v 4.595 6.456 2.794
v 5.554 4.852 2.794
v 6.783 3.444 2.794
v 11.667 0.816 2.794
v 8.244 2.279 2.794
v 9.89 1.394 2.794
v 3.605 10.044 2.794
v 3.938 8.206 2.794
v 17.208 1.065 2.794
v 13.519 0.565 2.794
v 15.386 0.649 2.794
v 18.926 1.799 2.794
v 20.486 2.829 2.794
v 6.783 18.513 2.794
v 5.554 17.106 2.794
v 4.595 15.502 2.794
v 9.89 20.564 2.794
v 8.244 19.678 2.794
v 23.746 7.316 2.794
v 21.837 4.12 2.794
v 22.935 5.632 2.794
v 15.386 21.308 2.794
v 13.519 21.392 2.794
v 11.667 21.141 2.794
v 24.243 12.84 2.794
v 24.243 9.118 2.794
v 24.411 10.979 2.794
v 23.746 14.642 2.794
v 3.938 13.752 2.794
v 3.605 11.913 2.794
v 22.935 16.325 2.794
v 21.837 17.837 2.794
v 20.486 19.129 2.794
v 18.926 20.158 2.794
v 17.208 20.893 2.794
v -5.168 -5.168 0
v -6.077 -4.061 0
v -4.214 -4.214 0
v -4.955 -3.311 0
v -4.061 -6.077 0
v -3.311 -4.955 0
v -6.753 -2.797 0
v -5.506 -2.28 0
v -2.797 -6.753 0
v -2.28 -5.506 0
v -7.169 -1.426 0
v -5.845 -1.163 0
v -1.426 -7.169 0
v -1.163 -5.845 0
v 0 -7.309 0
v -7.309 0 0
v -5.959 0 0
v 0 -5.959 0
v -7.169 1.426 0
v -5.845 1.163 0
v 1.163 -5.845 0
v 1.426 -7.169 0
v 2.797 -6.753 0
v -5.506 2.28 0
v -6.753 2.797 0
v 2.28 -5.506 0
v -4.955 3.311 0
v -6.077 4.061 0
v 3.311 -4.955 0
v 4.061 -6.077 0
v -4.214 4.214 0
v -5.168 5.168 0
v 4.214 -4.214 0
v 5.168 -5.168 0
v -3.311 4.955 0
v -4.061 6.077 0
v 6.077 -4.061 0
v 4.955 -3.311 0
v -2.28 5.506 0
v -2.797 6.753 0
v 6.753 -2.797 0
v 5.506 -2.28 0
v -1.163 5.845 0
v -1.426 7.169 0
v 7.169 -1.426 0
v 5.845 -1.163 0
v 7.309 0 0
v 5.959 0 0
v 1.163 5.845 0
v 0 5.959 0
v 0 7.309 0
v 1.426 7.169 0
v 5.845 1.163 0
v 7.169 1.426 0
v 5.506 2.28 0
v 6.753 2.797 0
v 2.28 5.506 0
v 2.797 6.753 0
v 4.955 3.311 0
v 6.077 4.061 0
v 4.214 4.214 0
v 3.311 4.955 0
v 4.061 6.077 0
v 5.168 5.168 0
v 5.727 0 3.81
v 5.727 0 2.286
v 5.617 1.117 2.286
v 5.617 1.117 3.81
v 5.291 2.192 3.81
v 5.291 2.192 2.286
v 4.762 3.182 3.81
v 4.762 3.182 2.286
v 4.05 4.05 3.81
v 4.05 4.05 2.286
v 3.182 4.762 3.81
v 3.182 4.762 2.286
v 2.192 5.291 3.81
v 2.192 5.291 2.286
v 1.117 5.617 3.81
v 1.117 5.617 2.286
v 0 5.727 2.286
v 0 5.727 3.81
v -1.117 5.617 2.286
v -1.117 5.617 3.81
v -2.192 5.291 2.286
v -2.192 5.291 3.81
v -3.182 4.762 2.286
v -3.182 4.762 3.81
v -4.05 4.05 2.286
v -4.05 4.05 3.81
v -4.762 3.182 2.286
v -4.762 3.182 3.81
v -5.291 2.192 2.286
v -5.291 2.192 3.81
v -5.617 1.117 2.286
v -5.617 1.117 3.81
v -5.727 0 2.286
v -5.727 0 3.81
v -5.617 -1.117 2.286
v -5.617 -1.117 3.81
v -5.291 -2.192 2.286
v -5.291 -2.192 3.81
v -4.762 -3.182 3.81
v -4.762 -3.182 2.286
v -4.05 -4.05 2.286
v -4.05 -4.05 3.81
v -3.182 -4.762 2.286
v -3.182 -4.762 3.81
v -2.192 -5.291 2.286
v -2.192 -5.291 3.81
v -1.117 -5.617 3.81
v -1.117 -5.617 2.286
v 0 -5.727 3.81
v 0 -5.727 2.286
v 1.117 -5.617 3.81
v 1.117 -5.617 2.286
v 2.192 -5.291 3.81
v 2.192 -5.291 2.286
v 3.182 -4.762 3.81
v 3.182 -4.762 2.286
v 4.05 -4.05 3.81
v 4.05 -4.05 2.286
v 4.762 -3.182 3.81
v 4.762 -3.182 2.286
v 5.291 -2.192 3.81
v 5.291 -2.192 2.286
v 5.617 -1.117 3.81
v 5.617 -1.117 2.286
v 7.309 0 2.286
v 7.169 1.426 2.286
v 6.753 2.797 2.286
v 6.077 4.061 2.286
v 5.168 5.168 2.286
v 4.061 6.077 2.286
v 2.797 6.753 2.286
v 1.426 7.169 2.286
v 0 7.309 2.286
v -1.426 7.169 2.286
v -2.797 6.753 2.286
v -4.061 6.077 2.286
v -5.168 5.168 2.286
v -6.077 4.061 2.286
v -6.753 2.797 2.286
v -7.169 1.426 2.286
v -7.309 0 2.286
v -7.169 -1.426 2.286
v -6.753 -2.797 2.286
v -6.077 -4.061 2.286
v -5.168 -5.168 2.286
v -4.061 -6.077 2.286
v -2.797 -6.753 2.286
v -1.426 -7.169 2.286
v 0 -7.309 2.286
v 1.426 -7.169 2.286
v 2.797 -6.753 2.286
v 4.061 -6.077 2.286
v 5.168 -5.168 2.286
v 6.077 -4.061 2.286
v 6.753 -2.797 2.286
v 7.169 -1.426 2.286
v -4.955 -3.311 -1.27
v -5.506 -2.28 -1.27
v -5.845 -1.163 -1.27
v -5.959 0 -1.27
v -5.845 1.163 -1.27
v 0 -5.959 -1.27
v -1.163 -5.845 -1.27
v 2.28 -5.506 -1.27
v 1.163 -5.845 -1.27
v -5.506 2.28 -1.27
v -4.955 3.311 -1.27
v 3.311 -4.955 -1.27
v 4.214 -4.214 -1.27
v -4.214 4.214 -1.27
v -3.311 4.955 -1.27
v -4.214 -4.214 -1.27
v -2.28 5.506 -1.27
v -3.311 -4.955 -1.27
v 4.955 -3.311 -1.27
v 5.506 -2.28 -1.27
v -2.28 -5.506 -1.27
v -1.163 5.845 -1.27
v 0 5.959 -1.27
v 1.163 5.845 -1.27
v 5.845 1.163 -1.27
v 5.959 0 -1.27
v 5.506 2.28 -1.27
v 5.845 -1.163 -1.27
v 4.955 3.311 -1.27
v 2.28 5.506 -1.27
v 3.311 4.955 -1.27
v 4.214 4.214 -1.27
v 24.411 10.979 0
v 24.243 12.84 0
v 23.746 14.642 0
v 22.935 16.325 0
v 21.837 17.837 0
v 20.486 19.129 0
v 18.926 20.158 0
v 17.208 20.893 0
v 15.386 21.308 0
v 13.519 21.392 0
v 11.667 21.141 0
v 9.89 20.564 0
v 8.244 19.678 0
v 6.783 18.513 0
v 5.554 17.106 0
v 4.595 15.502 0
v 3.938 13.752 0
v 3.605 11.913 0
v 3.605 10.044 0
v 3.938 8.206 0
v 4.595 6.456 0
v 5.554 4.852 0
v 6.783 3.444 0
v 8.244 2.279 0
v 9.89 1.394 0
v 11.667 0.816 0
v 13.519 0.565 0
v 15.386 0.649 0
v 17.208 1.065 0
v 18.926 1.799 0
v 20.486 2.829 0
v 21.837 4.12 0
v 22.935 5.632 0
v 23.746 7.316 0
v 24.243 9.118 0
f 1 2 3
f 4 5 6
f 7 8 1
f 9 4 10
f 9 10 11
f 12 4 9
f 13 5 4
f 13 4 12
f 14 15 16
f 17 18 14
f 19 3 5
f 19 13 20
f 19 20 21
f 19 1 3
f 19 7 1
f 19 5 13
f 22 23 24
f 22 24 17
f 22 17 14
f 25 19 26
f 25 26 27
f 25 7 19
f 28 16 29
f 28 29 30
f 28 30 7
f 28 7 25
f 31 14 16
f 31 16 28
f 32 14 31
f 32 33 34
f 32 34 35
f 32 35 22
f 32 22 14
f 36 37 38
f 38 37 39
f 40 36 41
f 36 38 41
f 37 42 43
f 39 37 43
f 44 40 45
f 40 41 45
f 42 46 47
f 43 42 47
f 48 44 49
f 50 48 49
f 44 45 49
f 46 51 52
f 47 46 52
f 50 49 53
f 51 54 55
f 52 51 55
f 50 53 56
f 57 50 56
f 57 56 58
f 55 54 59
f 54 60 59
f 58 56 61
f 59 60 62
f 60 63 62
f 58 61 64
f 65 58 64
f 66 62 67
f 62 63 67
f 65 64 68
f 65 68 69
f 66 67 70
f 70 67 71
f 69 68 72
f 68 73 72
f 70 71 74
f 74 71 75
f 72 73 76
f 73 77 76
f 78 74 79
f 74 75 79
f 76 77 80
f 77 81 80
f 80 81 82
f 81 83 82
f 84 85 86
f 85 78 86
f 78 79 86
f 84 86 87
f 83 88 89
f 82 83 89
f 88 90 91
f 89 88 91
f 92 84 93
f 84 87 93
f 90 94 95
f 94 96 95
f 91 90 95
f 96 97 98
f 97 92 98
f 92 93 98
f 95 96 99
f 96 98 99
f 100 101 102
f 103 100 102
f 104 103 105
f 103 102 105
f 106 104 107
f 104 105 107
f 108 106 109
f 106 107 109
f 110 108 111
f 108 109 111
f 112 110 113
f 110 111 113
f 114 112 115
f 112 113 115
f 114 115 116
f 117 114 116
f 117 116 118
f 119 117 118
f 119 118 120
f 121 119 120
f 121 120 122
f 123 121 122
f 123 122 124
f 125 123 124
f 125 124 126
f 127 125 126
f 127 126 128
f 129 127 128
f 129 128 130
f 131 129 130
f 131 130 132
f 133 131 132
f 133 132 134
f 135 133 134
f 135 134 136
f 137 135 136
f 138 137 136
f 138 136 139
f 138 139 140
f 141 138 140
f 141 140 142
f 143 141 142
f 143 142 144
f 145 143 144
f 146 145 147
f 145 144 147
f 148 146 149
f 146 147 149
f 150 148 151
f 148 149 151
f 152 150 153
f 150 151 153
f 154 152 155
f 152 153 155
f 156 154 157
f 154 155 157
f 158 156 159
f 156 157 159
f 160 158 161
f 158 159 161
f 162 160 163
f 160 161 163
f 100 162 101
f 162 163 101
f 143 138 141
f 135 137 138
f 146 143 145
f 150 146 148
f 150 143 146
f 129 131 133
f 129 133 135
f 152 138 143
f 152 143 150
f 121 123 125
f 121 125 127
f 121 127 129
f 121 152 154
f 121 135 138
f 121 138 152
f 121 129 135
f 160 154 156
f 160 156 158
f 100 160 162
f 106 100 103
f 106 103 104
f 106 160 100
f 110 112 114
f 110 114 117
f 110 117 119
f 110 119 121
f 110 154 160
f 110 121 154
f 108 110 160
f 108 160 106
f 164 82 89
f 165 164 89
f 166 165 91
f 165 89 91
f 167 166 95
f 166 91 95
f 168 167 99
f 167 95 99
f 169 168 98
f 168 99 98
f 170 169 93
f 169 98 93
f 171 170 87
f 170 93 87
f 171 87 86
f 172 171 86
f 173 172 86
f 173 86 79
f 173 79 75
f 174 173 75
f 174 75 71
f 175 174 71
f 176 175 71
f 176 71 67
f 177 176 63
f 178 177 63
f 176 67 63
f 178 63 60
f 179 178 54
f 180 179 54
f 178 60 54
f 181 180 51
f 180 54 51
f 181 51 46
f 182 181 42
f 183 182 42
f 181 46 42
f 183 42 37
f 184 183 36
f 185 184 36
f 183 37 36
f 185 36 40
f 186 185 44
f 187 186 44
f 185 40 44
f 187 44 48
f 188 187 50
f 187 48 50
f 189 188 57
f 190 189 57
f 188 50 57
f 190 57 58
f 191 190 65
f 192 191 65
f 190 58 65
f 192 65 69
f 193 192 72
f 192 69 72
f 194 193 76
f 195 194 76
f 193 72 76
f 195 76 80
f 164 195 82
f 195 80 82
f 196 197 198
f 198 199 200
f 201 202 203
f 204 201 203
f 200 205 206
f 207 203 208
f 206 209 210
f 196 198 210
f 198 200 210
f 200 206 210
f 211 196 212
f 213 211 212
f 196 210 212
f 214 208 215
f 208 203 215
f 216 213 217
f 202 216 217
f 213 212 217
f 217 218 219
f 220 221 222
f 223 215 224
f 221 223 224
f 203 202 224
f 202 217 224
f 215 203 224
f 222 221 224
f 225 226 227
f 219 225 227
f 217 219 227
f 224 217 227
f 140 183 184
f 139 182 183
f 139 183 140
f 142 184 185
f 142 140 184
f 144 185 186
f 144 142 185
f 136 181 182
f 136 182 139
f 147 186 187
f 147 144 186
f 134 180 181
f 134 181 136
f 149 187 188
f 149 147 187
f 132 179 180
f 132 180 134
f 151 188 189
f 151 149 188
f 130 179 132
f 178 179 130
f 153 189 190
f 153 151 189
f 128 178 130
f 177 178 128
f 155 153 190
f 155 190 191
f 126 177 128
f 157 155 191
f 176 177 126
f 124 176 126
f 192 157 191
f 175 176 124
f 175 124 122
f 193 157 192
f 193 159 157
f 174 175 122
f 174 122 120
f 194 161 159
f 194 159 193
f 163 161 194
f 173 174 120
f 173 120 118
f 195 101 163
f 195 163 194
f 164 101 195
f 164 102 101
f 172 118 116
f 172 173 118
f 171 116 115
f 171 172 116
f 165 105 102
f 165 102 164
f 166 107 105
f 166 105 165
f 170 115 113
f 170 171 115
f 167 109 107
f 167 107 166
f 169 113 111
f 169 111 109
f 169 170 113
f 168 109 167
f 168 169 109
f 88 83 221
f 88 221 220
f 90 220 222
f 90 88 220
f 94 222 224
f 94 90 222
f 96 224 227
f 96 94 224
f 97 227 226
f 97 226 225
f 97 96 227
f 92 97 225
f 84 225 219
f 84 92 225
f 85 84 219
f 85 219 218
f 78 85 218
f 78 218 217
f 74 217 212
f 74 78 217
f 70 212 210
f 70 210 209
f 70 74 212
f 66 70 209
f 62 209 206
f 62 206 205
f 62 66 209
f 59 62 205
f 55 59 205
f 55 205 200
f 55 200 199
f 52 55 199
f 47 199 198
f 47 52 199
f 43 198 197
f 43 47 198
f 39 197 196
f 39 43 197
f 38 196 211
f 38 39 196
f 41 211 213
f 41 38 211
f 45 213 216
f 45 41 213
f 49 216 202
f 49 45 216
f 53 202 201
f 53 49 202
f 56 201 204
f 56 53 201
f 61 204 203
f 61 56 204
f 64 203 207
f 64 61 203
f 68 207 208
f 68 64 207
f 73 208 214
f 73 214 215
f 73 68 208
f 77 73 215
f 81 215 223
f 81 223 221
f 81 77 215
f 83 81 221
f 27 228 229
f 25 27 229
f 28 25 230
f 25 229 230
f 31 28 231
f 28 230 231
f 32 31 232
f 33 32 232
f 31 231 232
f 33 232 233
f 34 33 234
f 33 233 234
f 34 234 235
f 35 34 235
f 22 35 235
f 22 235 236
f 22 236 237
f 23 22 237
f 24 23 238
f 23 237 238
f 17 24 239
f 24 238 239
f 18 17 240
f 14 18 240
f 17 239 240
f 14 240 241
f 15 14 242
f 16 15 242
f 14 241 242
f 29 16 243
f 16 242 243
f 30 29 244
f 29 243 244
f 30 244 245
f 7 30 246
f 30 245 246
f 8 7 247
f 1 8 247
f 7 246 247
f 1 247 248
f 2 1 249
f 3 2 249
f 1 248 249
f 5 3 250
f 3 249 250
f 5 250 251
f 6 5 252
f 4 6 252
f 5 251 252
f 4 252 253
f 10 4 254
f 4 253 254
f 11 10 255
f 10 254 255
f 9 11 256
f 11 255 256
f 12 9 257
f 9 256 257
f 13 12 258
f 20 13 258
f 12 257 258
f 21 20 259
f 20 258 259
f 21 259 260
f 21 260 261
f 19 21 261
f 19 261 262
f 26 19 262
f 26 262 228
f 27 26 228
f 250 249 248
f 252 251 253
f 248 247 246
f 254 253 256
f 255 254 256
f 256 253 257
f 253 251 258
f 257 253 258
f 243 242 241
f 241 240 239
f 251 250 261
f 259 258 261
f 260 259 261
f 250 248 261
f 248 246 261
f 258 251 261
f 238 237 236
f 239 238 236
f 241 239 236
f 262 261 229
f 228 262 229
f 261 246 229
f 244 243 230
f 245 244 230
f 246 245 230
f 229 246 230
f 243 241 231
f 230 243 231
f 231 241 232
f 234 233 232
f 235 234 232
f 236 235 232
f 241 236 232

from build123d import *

# Parameters (mm, degrees)
F0_R     = 7.309247
F1_DEPTH = 2.286
F2_R     = 5.726862
F3_DEPTH = 3.81
F4_R     = 5.959125
F5_DEPTH = 1.27
F6_R     = 10.423993
F7_DEPTH = 2.794


with BuildPart() as f1:
    # F0 (on Top) → F1 (new body)
    with BuildSketch(Plane.XY):
        Circle(F0_R)
    extrude(amount=F1_DEPTH)

    # F2 (on Top) → F3 (join)
    with BuildSketch(Plane.XY):
        Circle(F2_R)
    extrude(amount=F3_DEPTH)

    # F4 (on Top) → F5 (join)
    with BuildSketch(Plane.XY):
        Circle(F4_R)
    extrude(amount=-F5_DEPTH)


with BuildPart() as f7:
    # F6 (on Top) → F7 (new body)
    with BuildSketch(Plane.XY):
        with Locations((13.98671, 10.978816)):
            Circle(F6_R)
    extrude(amount=F7_DEPTH)


solid = Compound([f1.part, f7.part])
